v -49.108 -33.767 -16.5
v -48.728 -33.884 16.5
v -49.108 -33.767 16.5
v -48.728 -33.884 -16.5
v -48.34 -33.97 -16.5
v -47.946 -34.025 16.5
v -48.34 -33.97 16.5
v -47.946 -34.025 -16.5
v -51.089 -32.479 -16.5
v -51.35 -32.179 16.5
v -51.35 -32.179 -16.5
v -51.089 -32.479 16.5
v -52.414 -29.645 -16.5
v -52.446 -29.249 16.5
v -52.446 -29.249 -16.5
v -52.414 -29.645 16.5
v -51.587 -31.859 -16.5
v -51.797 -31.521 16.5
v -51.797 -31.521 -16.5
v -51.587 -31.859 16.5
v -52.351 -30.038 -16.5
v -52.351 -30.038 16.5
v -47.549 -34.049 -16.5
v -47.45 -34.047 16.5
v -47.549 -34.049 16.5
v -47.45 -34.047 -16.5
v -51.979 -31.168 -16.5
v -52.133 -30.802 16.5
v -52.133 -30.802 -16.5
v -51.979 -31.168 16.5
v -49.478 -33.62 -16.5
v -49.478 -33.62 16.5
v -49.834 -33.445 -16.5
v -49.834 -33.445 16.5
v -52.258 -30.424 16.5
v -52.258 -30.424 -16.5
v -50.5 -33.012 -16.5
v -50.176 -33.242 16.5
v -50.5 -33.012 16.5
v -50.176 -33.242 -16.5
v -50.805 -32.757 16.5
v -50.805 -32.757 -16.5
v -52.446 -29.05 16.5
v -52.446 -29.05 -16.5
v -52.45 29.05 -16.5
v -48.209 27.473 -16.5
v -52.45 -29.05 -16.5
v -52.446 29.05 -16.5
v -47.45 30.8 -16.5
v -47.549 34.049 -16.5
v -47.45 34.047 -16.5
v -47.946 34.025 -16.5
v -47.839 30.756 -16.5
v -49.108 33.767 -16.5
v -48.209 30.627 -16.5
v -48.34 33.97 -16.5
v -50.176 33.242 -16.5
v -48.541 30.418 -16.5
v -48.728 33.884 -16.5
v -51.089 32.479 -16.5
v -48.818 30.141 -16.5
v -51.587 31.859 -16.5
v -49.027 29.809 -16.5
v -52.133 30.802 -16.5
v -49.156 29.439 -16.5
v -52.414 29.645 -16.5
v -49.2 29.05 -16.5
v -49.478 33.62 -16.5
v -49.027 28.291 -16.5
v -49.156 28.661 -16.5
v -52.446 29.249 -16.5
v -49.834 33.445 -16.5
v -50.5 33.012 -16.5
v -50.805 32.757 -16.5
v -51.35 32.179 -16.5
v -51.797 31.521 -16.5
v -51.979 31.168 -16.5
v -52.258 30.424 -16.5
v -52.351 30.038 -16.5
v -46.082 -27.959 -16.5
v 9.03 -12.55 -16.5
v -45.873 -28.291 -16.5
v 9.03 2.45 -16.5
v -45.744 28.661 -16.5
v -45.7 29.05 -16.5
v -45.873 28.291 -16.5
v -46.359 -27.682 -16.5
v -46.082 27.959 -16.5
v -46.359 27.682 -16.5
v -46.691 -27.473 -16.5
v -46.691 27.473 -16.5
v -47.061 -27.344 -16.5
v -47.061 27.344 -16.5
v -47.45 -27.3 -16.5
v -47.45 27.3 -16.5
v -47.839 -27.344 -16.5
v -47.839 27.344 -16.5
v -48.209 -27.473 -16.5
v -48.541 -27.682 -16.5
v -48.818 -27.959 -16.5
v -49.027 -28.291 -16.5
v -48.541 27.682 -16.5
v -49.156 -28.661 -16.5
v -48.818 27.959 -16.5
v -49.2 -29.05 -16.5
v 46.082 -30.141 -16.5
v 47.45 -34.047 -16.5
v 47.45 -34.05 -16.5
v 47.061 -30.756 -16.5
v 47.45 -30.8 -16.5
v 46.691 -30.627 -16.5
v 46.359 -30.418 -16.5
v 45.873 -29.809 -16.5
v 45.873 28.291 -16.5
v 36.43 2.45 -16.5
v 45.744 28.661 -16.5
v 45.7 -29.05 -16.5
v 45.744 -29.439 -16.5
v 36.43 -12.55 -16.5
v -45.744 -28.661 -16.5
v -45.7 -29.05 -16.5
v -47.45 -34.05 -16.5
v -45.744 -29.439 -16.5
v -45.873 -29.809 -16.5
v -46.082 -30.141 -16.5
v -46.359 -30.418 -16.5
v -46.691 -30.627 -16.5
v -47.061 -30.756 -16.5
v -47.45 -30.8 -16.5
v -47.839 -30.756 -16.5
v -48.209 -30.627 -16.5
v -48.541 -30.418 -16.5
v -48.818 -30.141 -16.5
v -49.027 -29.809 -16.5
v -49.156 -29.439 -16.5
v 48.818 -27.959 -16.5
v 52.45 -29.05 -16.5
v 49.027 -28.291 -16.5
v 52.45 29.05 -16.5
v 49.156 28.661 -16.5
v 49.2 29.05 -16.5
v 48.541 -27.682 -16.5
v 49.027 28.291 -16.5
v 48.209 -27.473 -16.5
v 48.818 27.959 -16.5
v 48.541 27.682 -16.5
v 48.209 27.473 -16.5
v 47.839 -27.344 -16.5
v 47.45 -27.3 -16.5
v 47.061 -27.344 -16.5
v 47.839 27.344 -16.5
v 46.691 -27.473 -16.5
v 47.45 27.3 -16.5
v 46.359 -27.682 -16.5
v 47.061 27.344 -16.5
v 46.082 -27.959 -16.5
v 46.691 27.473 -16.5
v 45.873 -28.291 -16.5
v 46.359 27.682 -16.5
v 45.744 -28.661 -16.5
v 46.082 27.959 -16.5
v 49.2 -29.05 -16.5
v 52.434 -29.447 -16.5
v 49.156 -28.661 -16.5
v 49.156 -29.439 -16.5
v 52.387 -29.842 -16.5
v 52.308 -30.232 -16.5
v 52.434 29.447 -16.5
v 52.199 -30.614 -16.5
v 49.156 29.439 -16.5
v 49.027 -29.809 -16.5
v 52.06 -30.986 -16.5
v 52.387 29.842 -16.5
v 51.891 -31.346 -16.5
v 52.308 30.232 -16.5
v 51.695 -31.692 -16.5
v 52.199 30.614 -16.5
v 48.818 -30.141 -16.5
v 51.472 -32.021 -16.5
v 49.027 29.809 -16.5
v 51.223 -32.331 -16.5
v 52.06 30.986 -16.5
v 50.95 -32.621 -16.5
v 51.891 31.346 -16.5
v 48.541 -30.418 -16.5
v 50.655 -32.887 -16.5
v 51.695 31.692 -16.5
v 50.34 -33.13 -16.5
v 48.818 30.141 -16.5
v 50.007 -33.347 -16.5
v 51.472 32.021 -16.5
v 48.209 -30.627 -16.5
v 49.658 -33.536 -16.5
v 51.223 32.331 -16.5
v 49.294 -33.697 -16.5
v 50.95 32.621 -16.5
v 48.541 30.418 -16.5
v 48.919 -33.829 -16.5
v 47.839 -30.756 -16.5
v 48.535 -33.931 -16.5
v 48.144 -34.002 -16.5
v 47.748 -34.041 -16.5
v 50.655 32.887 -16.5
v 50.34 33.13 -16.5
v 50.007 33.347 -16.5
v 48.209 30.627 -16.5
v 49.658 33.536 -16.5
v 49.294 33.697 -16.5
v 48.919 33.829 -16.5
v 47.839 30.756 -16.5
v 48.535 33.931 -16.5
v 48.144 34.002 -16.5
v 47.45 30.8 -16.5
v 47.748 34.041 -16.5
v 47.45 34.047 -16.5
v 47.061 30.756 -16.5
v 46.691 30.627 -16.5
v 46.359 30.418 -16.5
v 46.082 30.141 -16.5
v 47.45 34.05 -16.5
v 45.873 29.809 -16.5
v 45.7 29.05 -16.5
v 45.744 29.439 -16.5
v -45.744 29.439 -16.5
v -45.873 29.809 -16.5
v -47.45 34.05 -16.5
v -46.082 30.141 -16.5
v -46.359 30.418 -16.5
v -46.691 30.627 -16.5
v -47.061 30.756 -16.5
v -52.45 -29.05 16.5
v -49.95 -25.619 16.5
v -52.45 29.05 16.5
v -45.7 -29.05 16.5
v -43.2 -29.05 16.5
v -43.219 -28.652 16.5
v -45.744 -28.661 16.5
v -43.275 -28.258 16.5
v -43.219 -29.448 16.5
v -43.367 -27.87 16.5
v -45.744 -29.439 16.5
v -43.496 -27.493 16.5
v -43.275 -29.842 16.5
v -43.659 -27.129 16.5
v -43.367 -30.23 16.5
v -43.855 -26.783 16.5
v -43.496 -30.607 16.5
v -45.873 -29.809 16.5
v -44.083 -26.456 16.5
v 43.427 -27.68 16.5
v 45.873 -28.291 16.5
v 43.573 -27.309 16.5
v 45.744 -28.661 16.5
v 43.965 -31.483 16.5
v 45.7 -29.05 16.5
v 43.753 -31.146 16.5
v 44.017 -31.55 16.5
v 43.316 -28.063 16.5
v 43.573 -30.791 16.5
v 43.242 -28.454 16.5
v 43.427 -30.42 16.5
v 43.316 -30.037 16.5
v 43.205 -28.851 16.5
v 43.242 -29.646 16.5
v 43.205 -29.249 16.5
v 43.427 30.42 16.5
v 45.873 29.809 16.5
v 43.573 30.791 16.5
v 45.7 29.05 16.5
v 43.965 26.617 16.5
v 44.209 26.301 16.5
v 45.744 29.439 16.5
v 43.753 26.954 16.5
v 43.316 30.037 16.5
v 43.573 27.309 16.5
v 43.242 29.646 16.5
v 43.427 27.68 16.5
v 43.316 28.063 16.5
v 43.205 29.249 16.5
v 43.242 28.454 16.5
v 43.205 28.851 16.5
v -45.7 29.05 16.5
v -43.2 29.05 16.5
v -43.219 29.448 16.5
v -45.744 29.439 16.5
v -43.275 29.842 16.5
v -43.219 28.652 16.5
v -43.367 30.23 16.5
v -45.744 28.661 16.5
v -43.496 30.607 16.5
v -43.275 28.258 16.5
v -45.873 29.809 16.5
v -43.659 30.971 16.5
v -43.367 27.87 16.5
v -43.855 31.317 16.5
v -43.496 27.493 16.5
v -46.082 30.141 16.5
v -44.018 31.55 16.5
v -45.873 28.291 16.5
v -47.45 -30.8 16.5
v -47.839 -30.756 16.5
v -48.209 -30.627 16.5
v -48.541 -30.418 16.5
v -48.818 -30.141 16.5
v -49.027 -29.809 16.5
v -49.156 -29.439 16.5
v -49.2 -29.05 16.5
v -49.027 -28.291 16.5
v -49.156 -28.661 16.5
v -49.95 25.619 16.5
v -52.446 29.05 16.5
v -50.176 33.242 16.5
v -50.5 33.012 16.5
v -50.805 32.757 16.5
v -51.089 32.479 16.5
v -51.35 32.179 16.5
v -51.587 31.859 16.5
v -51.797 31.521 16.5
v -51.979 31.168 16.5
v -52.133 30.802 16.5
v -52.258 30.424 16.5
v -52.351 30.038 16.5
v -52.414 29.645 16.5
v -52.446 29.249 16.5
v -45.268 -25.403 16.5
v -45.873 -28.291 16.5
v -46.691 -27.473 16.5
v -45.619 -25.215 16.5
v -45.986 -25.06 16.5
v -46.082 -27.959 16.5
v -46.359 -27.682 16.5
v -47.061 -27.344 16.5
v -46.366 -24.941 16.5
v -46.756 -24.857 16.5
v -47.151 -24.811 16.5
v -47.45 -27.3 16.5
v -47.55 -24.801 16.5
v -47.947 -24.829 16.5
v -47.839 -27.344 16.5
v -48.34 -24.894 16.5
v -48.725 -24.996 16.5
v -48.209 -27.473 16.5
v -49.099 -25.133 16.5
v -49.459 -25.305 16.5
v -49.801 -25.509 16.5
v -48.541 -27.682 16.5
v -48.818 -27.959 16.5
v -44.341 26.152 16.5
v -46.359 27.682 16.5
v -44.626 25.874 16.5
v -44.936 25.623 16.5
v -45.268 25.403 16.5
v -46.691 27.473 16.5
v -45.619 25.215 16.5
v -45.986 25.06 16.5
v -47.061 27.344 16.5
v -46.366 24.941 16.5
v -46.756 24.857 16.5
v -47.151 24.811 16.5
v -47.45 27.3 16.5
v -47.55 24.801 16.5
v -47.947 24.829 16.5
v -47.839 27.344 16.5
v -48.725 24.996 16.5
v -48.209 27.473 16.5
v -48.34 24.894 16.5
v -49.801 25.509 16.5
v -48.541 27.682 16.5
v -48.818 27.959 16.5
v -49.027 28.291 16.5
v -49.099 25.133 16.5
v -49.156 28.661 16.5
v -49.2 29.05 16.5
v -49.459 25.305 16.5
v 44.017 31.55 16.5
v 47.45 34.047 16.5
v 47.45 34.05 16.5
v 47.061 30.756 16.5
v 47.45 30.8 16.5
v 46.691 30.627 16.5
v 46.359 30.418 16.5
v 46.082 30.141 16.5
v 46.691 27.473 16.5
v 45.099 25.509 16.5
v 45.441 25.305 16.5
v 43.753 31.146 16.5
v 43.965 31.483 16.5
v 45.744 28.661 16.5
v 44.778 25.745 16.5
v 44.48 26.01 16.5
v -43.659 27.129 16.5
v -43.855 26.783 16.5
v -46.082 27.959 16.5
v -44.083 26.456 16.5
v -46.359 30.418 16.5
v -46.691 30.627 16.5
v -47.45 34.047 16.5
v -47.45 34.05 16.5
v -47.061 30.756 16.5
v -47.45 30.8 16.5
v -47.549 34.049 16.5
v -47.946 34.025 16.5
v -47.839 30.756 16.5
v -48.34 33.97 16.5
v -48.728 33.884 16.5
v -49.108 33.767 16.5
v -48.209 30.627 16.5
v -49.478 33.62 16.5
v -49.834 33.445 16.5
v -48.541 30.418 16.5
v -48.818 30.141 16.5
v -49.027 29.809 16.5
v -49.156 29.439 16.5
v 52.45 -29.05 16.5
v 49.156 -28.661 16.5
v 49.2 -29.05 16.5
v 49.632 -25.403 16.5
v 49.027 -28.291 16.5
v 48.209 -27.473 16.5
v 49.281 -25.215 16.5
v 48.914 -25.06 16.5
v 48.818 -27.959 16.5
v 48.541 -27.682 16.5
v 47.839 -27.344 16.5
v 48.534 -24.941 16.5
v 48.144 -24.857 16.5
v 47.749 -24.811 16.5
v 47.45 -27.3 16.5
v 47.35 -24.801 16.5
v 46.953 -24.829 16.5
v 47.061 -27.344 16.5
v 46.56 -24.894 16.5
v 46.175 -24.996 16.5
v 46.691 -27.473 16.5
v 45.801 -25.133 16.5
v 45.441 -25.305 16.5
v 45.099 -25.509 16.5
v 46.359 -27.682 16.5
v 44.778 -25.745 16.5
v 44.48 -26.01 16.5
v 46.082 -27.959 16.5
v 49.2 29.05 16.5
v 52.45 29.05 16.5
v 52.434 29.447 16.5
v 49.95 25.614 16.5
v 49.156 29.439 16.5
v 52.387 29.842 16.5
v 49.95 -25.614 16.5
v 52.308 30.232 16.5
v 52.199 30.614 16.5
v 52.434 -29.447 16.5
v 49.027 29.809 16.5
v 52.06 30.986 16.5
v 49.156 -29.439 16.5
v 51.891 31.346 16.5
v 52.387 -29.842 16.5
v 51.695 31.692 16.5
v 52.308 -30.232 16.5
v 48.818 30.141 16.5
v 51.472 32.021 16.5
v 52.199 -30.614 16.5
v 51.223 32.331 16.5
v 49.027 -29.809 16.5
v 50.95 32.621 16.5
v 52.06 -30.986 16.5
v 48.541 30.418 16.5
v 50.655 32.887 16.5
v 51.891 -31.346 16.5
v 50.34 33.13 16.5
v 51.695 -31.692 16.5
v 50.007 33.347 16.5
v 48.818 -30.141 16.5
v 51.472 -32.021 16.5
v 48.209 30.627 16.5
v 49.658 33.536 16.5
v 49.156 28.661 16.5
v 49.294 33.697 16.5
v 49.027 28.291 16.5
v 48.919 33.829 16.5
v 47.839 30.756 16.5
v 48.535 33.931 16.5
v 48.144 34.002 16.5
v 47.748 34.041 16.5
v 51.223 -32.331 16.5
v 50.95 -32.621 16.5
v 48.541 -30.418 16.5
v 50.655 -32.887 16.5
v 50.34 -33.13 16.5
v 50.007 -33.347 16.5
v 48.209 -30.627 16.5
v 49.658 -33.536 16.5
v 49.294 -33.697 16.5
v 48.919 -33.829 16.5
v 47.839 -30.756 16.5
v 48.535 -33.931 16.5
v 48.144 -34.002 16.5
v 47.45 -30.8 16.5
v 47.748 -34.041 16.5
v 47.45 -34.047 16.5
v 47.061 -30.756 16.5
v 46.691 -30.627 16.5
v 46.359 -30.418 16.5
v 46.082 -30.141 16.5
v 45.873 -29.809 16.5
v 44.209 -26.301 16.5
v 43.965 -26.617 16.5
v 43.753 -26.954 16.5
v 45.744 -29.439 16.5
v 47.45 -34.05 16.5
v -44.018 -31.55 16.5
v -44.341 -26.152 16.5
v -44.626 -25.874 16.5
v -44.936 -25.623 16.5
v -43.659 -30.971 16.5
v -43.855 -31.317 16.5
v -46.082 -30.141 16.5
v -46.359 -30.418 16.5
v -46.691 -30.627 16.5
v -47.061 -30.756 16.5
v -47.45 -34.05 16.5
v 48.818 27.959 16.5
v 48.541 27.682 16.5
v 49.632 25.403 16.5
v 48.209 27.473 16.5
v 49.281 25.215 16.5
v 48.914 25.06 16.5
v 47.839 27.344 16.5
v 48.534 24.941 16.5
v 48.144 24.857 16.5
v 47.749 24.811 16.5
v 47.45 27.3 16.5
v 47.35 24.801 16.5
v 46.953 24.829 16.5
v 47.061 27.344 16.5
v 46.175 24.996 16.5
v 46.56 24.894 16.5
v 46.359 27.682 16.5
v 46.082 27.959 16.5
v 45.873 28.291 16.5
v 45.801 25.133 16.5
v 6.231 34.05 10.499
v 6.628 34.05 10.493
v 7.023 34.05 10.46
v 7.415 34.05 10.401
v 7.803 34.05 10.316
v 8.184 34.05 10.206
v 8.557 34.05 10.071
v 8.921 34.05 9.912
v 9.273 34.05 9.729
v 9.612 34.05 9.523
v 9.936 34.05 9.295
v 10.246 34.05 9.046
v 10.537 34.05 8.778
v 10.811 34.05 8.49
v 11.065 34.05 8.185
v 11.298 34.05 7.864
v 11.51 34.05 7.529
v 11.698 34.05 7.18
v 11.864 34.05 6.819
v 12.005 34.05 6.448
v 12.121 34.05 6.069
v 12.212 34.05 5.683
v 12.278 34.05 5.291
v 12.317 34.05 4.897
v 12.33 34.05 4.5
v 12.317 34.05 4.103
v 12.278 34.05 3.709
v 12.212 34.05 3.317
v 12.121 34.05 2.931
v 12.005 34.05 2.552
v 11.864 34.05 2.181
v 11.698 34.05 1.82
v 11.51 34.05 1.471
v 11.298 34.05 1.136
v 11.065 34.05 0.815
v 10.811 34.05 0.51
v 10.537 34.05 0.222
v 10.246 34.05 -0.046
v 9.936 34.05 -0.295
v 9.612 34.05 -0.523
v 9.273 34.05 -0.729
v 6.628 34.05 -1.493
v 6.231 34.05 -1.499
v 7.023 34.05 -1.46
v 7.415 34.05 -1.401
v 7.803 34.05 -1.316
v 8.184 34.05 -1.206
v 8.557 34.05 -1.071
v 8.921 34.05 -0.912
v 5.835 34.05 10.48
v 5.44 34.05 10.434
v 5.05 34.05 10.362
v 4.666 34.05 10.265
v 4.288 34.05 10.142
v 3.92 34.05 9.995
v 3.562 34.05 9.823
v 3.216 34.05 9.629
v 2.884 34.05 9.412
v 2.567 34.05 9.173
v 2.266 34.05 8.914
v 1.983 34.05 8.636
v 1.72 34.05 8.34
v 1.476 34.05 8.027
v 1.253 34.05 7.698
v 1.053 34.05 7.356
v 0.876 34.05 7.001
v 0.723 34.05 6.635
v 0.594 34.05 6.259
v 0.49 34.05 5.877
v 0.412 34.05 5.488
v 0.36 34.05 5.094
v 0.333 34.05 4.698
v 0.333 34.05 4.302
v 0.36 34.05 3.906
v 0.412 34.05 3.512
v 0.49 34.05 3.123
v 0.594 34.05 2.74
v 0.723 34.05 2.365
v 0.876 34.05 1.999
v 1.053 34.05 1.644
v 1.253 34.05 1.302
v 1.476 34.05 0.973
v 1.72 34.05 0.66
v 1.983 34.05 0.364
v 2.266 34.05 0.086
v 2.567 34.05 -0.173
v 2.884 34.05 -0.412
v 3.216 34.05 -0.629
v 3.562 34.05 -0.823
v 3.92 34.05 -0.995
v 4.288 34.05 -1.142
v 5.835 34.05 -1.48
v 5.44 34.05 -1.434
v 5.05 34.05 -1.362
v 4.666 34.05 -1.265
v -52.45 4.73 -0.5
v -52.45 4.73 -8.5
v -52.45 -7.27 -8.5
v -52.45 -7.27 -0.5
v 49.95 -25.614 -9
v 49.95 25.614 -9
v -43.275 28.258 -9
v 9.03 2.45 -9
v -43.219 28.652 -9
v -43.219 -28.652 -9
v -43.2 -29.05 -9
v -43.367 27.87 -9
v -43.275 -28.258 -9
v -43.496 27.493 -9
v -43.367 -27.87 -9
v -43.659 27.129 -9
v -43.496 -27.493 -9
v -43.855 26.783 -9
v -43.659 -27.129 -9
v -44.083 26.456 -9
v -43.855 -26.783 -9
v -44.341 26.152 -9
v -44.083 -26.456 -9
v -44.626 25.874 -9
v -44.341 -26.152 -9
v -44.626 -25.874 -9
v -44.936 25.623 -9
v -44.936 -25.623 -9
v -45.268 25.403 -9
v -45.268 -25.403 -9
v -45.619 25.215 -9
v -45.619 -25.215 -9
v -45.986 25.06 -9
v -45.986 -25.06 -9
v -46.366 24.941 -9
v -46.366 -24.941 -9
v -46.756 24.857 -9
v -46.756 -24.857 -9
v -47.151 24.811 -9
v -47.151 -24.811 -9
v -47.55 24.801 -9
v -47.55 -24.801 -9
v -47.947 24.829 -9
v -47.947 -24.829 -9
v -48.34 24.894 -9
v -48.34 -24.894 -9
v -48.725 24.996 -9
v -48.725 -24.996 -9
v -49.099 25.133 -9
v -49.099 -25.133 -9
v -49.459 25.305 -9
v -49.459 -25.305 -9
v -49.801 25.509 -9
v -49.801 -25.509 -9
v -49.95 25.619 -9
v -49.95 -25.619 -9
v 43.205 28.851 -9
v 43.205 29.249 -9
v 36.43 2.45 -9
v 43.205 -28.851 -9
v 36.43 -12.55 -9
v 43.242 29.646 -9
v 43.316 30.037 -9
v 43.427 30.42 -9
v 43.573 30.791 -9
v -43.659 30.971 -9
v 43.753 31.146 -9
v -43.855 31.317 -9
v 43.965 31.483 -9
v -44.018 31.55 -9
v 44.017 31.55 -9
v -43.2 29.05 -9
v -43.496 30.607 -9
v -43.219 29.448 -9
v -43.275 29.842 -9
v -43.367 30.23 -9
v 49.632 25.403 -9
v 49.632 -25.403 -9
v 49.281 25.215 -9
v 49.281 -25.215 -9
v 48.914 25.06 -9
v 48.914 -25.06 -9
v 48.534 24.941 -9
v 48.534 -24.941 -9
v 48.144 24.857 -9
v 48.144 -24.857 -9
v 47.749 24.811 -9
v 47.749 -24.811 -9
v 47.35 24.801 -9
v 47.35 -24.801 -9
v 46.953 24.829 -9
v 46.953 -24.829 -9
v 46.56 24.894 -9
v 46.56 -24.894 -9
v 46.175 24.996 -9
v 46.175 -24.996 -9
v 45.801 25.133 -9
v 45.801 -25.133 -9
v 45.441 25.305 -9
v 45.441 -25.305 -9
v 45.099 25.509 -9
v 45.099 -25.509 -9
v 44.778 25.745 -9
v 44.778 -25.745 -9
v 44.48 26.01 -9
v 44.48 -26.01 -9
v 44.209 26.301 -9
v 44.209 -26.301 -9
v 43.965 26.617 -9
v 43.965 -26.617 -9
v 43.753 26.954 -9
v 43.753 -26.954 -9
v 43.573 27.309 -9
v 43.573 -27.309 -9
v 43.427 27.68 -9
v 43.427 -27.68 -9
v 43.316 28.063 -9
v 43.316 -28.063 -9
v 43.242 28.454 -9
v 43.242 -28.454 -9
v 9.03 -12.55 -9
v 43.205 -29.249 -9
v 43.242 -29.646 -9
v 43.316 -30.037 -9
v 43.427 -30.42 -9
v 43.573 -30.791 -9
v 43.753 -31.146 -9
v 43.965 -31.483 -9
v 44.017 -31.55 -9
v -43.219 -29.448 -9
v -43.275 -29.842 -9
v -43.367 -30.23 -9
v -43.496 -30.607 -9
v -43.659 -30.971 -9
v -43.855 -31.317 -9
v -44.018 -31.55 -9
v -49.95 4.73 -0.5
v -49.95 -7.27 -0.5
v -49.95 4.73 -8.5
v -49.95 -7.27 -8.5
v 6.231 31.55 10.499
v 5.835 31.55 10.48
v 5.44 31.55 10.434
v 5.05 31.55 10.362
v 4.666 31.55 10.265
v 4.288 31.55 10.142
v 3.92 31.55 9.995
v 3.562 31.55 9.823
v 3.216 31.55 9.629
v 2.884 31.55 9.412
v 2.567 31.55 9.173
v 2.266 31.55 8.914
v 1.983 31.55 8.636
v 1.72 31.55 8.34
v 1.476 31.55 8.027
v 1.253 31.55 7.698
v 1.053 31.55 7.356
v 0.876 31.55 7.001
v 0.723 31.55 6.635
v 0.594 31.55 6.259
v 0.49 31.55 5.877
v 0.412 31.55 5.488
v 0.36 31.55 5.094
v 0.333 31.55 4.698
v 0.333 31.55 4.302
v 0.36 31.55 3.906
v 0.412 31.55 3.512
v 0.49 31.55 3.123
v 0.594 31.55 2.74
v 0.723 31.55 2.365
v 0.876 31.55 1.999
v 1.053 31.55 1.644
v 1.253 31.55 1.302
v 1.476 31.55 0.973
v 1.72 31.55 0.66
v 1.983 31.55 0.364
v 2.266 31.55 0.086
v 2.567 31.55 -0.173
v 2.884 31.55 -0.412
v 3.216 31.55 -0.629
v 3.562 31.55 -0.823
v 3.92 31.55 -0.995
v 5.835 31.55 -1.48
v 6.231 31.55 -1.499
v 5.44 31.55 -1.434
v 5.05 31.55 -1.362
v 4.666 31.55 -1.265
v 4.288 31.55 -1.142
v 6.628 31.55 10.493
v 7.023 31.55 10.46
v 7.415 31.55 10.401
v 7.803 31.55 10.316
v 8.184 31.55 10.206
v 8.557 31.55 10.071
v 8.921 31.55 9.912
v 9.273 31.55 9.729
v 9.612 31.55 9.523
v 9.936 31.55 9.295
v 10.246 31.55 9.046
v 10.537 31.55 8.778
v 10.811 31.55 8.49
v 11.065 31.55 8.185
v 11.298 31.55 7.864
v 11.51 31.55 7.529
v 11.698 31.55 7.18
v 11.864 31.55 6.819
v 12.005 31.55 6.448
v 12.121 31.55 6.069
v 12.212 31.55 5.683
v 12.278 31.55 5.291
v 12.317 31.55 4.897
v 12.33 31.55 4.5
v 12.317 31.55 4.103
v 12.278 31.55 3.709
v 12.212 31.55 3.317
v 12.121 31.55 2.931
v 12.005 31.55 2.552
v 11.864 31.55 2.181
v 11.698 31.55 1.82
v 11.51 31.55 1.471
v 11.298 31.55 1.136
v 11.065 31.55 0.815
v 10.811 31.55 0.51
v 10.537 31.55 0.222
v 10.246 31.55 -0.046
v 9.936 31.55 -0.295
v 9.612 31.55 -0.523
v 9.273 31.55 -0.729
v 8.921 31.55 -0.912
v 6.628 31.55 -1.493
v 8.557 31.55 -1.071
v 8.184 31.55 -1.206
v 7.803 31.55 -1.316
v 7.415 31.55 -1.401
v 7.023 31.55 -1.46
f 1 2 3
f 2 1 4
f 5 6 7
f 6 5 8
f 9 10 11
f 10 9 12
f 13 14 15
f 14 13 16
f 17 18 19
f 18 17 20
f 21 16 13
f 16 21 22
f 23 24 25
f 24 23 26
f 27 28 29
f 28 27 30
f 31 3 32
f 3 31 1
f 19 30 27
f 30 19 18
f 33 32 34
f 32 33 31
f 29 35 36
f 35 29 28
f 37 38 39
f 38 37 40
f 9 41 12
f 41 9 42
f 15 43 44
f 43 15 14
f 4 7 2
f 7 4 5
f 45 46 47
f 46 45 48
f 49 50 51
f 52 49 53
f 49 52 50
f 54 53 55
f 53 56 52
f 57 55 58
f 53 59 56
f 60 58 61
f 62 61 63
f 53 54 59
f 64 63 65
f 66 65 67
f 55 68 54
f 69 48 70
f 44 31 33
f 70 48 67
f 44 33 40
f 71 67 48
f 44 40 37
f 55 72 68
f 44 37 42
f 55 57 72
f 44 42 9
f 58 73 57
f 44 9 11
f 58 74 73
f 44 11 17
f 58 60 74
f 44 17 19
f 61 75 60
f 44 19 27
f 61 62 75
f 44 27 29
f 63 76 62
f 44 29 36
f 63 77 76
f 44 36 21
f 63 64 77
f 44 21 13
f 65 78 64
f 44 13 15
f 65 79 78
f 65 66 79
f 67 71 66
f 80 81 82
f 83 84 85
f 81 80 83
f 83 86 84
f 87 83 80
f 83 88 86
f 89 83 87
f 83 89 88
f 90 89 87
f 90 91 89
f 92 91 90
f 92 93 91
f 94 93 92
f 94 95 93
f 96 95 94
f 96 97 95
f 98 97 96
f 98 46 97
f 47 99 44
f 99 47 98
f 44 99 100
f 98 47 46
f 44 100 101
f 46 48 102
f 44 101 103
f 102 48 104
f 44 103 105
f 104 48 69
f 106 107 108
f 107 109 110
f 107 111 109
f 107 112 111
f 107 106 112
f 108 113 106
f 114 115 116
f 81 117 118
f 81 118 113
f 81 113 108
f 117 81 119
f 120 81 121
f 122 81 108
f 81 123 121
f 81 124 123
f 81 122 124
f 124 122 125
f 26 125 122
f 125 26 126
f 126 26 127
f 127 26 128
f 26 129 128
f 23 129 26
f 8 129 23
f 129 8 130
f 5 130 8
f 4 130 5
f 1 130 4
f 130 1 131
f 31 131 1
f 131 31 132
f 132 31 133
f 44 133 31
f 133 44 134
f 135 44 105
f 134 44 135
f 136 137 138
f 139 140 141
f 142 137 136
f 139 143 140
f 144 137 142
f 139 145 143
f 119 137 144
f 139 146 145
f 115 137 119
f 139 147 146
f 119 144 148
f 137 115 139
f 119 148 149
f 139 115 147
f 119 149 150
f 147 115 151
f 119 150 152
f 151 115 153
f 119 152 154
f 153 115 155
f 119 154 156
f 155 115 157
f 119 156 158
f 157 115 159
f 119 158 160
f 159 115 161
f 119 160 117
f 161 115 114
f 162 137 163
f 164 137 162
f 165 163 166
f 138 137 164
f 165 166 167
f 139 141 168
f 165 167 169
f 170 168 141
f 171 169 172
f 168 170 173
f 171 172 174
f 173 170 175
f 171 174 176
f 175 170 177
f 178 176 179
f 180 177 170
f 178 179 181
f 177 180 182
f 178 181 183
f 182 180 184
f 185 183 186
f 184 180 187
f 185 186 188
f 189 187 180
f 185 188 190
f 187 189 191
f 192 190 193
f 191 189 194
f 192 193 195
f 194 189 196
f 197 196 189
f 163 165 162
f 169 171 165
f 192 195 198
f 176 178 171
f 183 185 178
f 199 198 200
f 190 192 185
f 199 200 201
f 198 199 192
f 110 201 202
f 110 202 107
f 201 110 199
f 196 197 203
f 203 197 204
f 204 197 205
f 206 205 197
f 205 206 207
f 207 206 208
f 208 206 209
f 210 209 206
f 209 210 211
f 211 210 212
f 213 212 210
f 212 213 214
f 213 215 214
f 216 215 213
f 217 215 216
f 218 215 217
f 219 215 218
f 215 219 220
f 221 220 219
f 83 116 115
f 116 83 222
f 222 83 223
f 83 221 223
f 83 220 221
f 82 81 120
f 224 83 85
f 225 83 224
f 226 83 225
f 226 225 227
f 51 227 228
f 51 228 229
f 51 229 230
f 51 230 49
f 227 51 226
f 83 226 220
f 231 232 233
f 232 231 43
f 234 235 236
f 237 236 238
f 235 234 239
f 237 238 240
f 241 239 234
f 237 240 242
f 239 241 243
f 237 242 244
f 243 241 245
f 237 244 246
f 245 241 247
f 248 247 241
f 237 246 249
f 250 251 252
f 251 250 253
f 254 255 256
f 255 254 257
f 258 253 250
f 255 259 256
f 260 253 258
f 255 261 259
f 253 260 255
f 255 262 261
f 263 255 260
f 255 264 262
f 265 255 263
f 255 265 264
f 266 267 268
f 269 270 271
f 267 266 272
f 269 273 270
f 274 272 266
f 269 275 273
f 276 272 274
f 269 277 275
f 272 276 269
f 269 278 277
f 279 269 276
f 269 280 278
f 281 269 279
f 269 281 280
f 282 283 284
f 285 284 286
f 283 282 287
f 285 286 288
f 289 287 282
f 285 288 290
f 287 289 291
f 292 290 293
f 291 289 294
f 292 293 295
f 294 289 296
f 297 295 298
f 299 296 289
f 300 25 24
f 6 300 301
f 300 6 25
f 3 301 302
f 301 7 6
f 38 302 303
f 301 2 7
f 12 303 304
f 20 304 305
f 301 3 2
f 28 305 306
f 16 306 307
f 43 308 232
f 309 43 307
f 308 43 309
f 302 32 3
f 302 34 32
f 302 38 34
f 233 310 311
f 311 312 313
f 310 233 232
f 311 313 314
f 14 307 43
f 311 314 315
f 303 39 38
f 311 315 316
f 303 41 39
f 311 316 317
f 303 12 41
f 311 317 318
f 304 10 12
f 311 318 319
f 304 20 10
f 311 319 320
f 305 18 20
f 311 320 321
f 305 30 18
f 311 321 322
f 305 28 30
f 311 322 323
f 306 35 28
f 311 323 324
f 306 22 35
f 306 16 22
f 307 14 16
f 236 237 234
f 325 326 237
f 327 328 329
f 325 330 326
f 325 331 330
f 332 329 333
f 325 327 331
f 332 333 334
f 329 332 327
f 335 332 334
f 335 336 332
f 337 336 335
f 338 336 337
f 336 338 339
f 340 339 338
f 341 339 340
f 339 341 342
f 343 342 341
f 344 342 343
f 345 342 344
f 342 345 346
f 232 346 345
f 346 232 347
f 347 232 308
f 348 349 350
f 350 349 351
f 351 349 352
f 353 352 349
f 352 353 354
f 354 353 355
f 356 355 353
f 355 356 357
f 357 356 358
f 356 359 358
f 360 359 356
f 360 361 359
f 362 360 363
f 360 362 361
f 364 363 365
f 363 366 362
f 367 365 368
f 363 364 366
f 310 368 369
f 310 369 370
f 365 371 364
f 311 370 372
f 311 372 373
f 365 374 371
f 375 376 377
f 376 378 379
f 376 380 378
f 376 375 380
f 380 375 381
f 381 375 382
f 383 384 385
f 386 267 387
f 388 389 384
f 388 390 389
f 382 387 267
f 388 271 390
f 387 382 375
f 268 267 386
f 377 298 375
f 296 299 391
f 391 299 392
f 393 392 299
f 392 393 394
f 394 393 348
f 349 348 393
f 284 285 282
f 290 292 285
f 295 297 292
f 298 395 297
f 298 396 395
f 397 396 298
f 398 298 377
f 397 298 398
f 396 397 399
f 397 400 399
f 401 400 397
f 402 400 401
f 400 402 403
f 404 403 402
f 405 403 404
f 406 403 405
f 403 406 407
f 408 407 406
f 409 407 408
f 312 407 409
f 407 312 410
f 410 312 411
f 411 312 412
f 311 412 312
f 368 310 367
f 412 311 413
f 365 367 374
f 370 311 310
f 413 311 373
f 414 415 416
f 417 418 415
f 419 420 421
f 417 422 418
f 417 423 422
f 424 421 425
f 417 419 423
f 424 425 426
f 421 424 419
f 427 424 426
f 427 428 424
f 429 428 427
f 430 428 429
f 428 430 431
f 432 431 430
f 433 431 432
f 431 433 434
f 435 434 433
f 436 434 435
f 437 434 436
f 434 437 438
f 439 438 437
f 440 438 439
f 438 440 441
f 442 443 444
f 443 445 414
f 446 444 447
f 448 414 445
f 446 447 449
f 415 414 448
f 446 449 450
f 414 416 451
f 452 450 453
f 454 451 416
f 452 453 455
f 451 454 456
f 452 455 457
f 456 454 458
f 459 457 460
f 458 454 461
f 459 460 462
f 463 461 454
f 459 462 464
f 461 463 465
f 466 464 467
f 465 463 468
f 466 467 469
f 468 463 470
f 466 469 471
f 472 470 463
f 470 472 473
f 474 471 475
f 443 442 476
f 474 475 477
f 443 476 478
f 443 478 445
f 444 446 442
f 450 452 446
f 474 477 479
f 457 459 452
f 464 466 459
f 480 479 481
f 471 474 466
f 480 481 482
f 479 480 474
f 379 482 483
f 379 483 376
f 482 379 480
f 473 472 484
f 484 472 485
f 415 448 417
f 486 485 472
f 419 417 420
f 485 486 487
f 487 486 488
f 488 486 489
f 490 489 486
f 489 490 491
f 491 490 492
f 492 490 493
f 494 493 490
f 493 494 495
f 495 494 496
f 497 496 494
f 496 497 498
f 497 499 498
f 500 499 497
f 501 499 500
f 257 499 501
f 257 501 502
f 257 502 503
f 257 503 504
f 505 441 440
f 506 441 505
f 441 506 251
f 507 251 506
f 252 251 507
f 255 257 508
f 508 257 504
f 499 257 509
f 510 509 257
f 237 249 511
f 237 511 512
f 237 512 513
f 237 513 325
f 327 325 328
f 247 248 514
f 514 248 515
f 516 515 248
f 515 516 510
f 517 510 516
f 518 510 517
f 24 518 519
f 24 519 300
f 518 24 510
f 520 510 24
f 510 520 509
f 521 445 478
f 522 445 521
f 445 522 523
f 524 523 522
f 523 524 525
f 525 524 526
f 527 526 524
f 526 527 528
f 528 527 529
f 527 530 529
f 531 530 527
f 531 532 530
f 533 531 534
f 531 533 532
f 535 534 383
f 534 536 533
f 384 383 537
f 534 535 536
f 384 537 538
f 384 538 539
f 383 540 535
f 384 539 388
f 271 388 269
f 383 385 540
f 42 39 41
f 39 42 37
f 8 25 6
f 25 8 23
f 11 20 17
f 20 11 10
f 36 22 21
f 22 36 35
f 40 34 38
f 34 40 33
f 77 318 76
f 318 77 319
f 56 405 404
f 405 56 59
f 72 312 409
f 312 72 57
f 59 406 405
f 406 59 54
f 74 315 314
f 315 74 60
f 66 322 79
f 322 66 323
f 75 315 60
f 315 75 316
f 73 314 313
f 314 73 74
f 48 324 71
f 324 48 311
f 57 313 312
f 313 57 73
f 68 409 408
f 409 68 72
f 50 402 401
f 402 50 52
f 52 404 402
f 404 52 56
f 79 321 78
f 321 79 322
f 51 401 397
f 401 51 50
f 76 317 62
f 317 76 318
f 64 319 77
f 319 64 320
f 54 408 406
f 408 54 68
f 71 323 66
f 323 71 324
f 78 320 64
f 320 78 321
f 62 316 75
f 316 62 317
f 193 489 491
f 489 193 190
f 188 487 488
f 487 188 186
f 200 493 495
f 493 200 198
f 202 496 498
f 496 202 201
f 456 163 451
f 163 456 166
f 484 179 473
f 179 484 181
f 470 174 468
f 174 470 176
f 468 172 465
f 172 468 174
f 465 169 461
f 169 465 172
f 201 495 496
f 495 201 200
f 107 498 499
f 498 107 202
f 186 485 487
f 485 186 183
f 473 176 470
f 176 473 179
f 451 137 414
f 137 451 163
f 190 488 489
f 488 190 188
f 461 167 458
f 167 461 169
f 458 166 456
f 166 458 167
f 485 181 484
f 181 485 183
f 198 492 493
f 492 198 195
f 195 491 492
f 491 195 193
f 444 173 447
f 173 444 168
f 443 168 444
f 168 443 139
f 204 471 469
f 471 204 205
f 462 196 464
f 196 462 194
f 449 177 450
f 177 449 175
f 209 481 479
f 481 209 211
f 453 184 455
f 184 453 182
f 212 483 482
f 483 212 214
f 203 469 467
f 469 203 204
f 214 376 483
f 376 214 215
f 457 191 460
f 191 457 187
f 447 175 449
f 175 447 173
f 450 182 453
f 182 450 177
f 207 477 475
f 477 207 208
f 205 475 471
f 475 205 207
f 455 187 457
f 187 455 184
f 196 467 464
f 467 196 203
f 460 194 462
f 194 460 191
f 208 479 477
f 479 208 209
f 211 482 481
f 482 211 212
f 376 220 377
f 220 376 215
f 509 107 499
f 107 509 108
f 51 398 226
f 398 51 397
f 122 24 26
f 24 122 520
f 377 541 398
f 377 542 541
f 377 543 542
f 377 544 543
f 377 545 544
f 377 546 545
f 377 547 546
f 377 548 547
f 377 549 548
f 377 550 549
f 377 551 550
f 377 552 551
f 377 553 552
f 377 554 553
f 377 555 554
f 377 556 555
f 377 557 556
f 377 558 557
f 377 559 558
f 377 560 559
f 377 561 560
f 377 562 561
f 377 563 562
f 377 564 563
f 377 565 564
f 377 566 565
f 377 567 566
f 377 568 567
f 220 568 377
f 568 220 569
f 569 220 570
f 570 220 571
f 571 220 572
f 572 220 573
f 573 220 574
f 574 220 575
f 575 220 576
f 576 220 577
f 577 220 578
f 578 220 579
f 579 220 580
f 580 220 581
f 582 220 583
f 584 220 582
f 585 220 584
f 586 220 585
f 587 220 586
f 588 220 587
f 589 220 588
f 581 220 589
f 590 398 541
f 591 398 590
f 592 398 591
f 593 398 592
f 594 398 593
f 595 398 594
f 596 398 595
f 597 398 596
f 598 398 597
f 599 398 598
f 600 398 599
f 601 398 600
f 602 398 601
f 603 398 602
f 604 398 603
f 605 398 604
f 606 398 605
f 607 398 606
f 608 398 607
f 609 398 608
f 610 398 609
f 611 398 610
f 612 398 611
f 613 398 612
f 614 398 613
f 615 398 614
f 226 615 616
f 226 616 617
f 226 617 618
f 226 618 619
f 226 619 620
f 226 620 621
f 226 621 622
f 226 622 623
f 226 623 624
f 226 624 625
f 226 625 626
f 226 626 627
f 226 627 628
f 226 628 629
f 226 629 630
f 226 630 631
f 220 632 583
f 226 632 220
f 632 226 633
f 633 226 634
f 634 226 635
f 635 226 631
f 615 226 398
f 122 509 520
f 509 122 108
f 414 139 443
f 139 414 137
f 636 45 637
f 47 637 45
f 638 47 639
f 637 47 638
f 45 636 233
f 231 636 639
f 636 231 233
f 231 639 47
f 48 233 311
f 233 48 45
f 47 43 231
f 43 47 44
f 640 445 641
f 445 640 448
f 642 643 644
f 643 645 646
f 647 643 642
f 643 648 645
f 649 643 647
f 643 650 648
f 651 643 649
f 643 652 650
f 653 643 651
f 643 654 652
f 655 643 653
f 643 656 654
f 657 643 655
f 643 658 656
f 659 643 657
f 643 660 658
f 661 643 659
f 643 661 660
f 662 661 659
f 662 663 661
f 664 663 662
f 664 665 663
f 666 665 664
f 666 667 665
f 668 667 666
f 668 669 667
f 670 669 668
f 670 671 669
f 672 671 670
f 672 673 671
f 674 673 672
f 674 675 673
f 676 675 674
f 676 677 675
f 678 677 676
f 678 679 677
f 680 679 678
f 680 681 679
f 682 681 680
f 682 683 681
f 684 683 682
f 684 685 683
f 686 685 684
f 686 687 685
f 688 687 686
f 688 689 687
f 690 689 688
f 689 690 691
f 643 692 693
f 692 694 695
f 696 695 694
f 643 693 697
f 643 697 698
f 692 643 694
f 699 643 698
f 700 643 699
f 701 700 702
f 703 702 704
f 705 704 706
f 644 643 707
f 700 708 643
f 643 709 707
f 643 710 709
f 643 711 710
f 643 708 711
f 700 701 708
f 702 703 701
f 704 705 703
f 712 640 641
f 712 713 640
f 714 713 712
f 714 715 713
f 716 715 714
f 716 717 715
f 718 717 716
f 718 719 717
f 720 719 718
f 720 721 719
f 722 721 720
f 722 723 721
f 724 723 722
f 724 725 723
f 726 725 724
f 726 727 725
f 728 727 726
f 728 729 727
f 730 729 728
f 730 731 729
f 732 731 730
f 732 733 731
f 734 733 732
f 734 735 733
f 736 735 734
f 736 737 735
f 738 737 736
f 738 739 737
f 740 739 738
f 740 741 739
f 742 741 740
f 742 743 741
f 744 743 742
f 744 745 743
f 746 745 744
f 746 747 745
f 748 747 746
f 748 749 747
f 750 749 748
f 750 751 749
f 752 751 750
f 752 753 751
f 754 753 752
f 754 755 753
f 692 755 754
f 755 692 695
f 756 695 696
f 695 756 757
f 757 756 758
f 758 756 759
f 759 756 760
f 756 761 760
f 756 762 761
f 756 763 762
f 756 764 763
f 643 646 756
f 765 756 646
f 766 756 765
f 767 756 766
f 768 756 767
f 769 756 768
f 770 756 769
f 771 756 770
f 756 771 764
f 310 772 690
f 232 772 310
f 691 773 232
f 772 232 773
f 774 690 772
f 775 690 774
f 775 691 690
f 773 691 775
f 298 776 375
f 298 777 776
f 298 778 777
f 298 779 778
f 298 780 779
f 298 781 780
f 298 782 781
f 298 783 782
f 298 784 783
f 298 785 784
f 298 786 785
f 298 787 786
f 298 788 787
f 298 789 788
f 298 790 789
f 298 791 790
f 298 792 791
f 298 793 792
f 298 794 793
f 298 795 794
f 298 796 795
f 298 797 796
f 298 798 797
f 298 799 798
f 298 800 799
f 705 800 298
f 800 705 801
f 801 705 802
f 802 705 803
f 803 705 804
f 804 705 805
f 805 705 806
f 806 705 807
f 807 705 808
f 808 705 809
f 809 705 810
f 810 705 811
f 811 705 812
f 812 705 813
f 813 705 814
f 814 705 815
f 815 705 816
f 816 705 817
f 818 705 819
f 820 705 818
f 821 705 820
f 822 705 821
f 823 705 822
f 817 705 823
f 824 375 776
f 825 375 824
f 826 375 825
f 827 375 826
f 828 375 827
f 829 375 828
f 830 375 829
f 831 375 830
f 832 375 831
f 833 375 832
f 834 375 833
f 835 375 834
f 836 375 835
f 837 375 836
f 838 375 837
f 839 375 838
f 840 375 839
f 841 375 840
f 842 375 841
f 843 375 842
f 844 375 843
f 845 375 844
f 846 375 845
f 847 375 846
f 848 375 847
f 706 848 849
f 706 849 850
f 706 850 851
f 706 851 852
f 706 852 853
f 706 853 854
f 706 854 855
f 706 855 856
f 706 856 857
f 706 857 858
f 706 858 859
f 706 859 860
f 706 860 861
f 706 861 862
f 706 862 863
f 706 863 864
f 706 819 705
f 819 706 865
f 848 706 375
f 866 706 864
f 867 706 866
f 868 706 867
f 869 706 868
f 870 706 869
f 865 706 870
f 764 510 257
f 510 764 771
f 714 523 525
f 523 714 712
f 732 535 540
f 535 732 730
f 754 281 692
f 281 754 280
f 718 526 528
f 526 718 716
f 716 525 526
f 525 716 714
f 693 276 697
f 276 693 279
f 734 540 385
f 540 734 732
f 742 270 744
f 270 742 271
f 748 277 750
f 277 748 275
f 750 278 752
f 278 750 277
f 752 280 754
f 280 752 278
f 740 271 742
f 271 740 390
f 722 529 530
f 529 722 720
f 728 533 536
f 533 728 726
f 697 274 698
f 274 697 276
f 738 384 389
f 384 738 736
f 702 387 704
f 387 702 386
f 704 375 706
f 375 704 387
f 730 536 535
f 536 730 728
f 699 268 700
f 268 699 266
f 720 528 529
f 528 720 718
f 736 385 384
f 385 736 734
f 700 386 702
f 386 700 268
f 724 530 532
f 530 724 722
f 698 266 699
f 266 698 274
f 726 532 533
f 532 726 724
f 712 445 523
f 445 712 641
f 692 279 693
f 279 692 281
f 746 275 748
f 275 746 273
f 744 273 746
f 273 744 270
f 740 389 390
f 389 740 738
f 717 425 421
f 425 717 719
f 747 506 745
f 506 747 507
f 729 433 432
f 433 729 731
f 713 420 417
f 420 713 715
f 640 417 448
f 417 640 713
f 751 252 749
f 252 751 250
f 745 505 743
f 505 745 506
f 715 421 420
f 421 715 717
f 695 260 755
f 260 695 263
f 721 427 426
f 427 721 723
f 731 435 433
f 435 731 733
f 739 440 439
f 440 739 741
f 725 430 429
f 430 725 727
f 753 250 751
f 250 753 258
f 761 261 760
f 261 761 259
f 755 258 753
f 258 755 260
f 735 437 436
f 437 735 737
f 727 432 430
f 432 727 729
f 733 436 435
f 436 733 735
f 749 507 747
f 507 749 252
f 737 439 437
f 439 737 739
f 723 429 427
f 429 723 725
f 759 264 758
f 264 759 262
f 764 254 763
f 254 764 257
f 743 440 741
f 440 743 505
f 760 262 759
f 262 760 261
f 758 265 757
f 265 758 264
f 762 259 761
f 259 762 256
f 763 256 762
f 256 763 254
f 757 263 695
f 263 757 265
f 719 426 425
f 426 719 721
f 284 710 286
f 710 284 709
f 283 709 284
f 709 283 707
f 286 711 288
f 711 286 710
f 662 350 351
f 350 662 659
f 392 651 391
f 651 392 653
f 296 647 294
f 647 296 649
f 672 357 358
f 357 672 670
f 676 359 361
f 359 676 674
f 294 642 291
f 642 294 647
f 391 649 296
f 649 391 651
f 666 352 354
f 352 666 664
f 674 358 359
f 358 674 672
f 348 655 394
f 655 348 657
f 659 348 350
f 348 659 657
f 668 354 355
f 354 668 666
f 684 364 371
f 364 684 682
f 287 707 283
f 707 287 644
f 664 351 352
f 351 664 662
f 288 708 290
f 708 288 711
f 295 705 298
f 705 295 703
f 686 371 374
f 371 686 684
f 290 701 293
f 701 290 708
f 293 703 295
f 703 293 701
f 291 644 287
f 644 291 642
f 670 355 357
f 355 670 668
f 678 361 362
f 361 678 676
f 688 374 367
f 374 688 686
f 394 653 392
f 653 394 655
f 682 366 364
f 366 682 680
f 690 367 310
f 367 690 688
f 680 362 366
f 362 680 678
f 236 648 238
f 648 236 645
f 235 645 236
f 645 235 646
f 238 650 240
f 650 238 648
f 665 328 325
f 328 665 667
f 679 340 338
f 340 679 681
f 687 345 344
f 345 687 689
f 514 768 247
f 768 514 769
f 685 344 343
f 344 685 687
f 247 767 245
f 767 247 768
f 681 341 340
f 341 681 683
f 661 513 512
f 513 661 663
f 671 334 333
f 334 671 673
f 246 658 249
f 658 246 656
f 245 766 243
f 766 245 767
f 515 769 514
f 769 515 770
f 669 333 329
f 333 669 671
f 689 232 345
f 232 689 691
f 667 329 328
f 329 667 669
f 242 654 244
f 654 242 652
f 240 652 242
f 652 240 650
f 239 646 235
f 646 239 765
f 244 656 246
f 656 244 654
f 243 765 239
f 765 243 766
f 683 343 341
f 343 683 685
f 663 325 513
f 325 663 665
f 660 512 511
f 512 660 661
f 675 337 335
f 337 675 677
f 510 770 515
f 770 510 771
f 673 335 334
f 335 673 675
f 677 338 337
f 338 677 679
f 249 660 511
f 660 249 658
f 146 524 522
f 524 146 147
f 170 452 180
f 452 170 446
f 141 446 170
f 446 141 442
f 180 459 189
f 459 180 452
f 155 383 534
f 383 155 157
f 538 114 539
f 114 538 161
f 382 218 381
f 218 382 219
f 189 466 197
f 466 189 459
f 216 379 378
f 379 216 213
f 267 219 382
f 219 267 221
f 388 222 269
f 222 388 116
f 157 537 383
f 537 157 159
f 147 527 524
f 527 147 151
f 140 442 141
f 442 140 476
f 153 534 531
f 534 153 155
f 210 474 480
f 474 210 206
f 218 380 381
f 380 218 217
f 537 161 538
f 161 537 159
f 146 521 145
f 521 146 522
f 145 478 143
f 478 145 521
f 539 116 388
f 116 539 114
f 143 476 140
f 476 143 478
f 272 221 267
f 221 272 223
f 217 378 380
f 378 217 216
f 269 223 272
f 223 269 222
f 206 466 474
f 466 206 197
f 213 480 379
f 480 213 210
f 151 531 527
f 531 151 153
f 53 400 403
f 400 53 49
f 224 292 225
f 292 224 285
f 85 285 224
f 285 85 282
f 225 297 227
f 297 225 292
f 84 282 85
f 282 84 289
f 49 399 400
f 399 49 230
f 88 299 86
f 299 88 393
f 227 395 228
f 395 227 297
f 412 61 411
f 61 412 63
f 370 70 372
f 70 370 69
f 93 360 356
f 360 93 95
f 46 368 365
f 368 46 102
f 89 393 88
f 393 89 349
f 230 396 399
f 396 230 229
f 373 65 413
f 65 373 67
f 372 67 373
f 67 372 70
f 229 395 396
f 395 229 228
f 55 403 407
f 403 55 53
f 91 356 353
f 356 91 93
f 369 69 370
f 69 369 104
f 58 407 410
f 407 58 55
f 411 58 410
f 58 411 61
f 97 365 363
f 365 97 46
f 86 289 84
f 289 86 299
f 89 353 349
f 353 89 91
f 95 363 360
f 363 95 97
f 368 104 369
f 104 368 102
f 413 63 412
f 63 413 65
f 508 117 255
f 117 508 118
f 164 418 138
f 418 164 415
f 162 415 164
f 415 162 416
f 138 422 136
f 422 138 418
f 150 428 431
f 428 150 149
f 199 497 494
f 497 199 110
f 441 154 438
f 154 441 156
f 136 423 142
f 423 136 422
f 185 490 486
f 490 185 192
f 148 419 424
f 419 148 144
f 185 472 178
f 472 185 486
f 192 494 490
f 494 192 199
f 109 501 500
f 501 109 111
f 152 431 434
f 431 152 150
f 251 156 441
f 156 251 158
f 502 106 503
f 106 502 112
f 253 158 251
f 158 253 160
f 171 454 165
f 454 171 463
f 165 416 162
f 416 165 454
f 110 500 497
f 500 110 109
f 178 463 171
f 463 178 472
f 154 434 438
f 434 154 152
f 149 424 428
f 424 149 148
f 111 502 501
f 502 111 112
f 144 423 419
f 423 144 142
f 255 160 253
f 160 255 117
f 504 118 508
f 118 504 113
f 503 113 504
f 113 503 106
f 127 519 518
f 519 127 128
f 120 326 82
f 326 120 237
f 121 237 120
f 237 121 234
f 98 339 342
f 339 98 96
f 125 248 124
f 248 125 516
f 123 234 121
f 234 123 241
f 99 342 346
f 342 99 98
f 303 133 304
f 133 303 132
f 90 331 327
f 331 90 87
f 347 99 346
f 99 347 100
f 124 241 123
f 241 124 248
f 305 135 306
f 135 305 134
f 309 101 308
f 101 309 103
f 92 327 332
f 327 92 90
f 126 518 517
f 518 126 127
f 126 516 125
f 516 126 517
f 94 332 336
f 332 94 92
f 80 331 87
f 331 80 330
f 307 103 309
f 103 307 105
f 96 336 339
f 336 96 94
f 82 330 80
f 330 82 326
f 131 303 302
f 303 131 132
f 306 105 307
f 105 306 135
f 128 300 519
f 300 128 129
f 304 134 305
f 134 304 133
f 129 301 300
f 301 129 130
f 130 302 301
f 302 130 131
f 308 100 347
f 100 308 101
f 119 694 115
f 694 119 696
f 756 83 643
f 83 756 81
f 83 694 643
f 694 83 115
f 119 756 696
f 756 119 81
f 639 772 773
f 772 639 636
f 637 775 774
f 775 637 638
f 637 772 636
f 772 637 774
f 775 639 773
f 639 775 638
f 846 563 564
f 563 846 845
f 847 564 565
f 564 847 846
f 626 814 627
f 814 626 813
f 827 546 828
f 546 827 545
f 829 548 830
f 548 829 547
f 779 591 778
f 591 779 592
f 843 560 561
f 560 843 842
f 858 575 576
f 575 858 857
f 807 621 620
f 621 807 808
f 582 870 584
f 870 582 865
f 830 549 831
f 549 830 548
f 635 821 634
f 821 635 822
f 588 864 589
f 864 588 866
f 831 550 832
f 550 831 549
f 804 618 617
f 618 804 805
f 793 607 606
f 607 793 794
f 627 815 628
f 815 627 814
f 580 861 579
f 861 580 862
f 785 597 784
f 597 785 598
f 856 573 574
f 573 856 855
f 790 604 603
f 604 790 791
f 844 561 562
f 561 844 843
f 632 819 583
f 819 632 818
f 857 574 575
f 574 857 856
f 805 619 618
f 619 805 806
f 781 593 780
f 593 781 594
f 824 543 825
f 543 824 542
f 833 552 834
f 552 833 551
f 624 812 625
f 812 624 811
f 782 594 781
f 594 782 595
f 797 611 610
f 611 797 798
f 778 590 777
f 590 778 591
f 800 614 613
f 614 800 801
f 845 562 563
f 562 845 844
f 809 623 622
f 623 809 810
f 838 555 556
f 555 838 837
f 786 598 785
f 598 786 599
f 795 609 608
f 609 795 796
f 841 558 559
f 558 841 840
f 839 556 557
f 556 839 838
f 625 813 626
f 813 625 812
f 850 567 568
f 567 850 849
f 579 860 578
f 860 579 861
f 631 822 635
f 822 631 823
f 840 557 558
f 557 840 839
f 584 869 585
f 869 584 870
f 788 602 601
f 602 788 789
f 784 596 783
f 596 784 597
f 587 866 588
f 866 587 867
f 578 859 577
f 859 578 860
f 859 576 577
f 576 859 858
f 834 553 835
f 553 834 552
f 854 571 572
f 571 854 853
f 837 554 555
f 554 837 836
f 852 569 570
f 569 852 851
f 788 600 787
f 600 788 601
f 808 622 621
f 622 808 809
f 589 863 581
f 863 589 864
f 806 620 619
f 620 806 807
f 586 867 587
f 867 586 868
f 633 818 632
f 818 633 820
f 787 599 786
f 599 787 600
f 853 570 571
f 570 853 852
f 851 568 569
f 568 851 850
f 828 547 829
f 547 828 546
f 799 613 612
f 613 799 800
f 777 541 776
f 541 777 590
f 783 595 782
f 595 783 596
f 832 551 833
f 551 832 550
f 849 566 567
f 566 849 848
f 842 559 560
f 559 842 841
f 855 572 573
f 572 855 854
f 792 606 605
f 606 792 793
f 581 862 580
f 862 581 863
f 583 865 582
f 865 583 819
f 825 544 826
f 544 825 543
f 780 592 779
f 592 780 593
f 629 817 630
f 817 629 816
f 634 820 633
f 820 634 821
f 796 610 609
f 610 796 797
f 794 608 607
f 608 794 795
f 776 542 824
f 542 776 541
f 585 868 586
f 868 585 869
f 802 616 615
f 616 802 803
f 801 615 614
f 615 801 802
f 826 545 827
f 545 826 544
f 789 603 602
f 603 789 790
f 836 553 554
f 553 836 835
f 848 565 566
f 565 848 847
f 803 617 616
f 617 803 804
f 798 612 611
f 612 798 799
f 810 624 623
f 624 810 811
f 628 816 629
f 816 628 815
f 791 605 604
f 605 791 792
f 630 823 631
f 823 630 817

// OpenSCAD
// file: parameters.scad
// Case for Halfsize Electrocookie board
// Parameters for include to keep them same for top and bottom.
// Provide parameters for different electrocookie boards
// Default to halfsize.
// All sizes in mm (even though it is mostly inch based board)

//TODO, this should be modulerized
//For now keep the vars in an include file


//Global rendering vars
$fa = 1;
$fs = 0.4;

// board_length
board_length =
(board_version == "full") ? 172.7:
(board_version == "half") ? 88.9:
(board_version == "mini") ? 50.8:88.9;

// board_length
board_width =
(board_version == "full") ? 52.1:
(board_version == "half") ? 52.1:
(board_version == "mini") ? 38.1:52.1;

//m3_hole_distance
m3_hole_distance =
(board_version == "full") ? 78.7:
(board_version == "half") ? 73.7:
(board_version == "mini") ? 40.6:73.7;

//row_count
row_count =
(board_version == "full") ? 63:
(board_version == "half") ? 30:
(board_version == "mini") ? 17:30;

//Distance from edge to first row
first_row =
(board_version == "full") ? 7.65:
(board_version == "half") ? 7.6:
(board_version == "mini") ? 5.1:7.6;

first_column =
(board_version == "full") ? 12:
(board_version == "half") ? 12:
(board_version == "mini") ? 5.1:12;


//Common parameters

board_buffer = 3;
wall_depth = 2.5;

row_spacing = 2.54;


box_length = board_length +4*wall_depth + 2*board_buffer;
box_width = board_width + 4*wall_depth + 2*board_buffer;
corner_radius=5;

knurl_depth = 5;

corner_screw_distance = 5;

// Custom features

// OLED display
oled_width = 27.40;
oled_display_width = oled_width;
oled_height = 28;
oled_display_height = 15;
oled_bottom_space = 8;
oled_pin1 = 10;
oled_pin_from_top = 2;
// file: knurlpocket.scad
//Module to create a knurl pocket suitable for Heat-set inserts

// Articles about knurl insert
//https://hackaday.com/2019/02/28/threading-3d-printed-parts-how-to-use-heat-set-inserts/
//https://clevercreations.org/brass-threaded-inserts-plastic-3d-printing/

//Global vars
$fa = 1;
$fs = 0.2;
knurl_radius = 2.5;
knurl_wall = 2.5;


module m3knurl_ring(knurl_depth = 5)
{

    difference() {   
        cylinder(h=knurl_depth, r=knurl_radius+knurl_wall,center=true);
        m3knurl_pocket(knurl_depth = 5);
    }
    
}

module m3knurl_pocket(knurl_depth = 5)
{
 union() {
    cylinder(h=knurl_depth+0.001, r=knurl_radius, center=true);
    translate([0,0,0.4*knurl_depth])
        cylinder(h=0.25 * knurl_depth, r1=knurl_radius, r2=1.2*knurl_radius, center=true);
 }
}

m3knurl_ring();
translate([10,0,0]) m3knurl_pocket();
// file: topbox.scad
// Case for Electrocookie board
// Top and actual box


// TODO
// Side walls are 2.5 mm. OK but change name of params to reflect reality
// Top is 7.5 mm
//   Full 5 mm depth
//   -5mm from center, but should be 2.5 mm and then if wall is really 2.5 mm change wall depth
// With this box can be 5mm lower and USB port still fit


use <knurlpocket.scad>
use <MCAD/boxes.scad>

//================Variables=========================
//Define type of electrocookie board
// full, half, mini

// Row where the first pin of the display is placed
// Set to 0 (default) if no display
// Display type is 0.96" OLED

// Row where the first pin of the phone jack is placed
// Set to 0 (default) if no phone jack
// Assume using column A

// Column where the first pin of the ESP32 board is placed
// Set to empty string (default) if no ESP32
// ESP32 board is DEVKIT, 30pin
//=======================================================
module topbox(
    board_version,
    display_pin1_row=0,
    jack_pin1_row=0,
    ESP32_pin1_column=""
    )
{
include <parameters.scad>
    board_height = 17.25;
    air_gap = 5.75; // space above top of board
    top_height = 2*wall_depth + board_height + knurl_depth + air_gap;
    top_length = box_length;
    top_width = box_width;
    screw_radius = 1.75;
    echo("topbox size:",top_length,top_width,top_height);

    inside_length = top_length-2*wall_depth;
    inside_width = top_width-2*wall_depth;
    inside_height = top_height-2*wall_depth;
    inside_offset = 2*wall_depth;
    echo("Inside size:",inside_length,inside_width,inside_height);
    echo("Side wall width:",(top_length-inside_length)/2);
    echo("Top wall width:",top_height - inside_height+inside_offset/2);


    difference() {
    union() {
    difference() {
    //top box walls
      //cube([top_length,top_width,top_height],center=true);
      roundedBox(size=[top_length,top_width,top_height],radius=corner_radius,sidesonly=true);
      translate([0,0,inside_offset])
      cube([inside_length,inside_width,inside_height],center=true);
    }

    // screw columns
      translate([(top_length/2-corner_screw_distance),
        (top_width/2-corner_screw_distance),
        0])
        cylinder(r=screw_radius + wall_depth,h=top_height, center=true);
      translate([(top_length/2-corner_screw_distance),
        -(top_width/2-corner_screw_distance),
        0])
        cylinder(r=screw_radius + wall_depth,h=top_height, center=true);
      translate([-(top_length/2-corner_screw_distance),
        (top_width/2-corner_screw_distance),
        0])
        cylinder(r=screw_radius + wall_depth,h=top_height, center=true);
      translate([-(top_length/2-corner_screw_distance),
        -(top_width/2-corner_screw_distance),
        0])
        cylinder(r=screw_radius + wall_depth,h=top_height, center=true);
    }

    //screw holes
      translate([top_length/2-corner_screw_distance,
        top_width/2-corner_screw_distance,
        0])
        cylinder(r=screw_radius,h=top_height+0.01, center=true);
      translate([- (top_length/2-corner_screw_distance),
        top_width/2-corner_screw_distance,
        0])
        cylinder(r=screw_radius,h=2*top_height+0.01, center=true);
      translate([(top_length/2-corner_screw_distance),
        -(top_width/2-corner_screw_distance),
        0])
        cylinder(r=screw_radius,h=top_height+0.01, center=true);
      translate([-(top_length/2-corner_screw_distance),
        -(top_width/2-corner_screw_distance),
        0])
        cylinder(r=screw_radius,h=top_height+0.01, center=true);


    // display hole if exist
        if (display_pin1_row != 0) {
            // Assume it is in column J
            oled_center_from_top = first_column+(oled_height/2-oled_pin_from_top);
            oled_top_space = oled_height - oled_display_height - oled_bottom_space;
            y_offset = oled_bottom_space - oled_top_space;
            display_center_from_top = oled_center_from_top - y_offset;
            oled_center_y = - (board_width/2 - display_center_from_top);
            // Use display_row
            oled_pin1_from_left = first_row + (display_pin1_row-1)*row_spacing;
            oled_center_from_pin1 = oled_width/2 - oled_pin1;
            oled_center_x = (oled_pin1_from_left + oled_center_from_pin1) - board_length/2;
            echo("OLED center",oled_center_x, oled_center_y);
            echo("OLED left edge from box edge",box_length/2 + oled_center_x - oled_display_width/2);
            echo("OLED bottom edge from box edge",box_width/2 - oled_center_y - oled_display_height/2);
            translate([oled_center_x, oled_center_y, 0])
                cube([oled_display_width,oled_display_height,top_height+1],center=true);
        }

    // USB hole if ESP32 exist
        if ((ESP32_pin1_column == "A") || (ESP32_pin1_column == "B")) {

            usb_width = 12;
            usb_height = 8;
            usb_center_from_bottom = 21;

            // center_z is 21mm from bottom plate or top of this print
            center_z = top_height / 2 - usb_center_from_bottom;
            // If Column A, half row above center Y, if B half row below center Y
            center_y = (ESP32_pin1_column == "A") ? row_spacing/2 : -row_spacing/2;
            translate([-top_length/2, center_y, center_z])
                cube([4*wall_depth, usb_width,usb_height],center=true);
            echo("Looking at outside, plate at bottom");
            echo("usb right edge from box edge",top_width/2-center_y-usb_width/2);
            echo("usb bottom edge from bottom edge",usb_center_from_bottom-usb_height/2);

        }
    // Jack hole if exist
        if (jack_pin1_row != 0) {

            jack_radius = 6;
            jack_center_from_bottom = 12;

            // center_z is 12mm from bottom plate or top of this print
            center_z = top_height / 2 - jack_center_from_bottom;
            // center_x is pin1 + 2 row_spacings
            // add 1, 2 more -1 as as first pin is 1 not 0
            board_x = first_row + (jack_pin1_row + 1) * row_spacing;
            center_x = board_x - board_length/2;
            translate([center_x, top_width/2, center_z])
                rotate([90,0,0])
                cylinder(r=jack_radius,h=4*wall_depth, center=true);
            echo("Looking at outside, plate at bottom");
            echo("jack center from box right edge",top_length/2-center_x);
            echo("jack center from bottom edge",jack_center_from_bottom);

        }
    }
}


//Size of electrocookie board for testing
//Do not include in design
//roundedBox(size=[board_length,board_width,1],radius=5.1,sidesonly=true);
// main file
use <topbox.scad>
topbox(
    board_version="half",
    display_pin1_row = 23,
    jack_pin1_row = 16,
    ESP32_pin1_column = "B"
    );
